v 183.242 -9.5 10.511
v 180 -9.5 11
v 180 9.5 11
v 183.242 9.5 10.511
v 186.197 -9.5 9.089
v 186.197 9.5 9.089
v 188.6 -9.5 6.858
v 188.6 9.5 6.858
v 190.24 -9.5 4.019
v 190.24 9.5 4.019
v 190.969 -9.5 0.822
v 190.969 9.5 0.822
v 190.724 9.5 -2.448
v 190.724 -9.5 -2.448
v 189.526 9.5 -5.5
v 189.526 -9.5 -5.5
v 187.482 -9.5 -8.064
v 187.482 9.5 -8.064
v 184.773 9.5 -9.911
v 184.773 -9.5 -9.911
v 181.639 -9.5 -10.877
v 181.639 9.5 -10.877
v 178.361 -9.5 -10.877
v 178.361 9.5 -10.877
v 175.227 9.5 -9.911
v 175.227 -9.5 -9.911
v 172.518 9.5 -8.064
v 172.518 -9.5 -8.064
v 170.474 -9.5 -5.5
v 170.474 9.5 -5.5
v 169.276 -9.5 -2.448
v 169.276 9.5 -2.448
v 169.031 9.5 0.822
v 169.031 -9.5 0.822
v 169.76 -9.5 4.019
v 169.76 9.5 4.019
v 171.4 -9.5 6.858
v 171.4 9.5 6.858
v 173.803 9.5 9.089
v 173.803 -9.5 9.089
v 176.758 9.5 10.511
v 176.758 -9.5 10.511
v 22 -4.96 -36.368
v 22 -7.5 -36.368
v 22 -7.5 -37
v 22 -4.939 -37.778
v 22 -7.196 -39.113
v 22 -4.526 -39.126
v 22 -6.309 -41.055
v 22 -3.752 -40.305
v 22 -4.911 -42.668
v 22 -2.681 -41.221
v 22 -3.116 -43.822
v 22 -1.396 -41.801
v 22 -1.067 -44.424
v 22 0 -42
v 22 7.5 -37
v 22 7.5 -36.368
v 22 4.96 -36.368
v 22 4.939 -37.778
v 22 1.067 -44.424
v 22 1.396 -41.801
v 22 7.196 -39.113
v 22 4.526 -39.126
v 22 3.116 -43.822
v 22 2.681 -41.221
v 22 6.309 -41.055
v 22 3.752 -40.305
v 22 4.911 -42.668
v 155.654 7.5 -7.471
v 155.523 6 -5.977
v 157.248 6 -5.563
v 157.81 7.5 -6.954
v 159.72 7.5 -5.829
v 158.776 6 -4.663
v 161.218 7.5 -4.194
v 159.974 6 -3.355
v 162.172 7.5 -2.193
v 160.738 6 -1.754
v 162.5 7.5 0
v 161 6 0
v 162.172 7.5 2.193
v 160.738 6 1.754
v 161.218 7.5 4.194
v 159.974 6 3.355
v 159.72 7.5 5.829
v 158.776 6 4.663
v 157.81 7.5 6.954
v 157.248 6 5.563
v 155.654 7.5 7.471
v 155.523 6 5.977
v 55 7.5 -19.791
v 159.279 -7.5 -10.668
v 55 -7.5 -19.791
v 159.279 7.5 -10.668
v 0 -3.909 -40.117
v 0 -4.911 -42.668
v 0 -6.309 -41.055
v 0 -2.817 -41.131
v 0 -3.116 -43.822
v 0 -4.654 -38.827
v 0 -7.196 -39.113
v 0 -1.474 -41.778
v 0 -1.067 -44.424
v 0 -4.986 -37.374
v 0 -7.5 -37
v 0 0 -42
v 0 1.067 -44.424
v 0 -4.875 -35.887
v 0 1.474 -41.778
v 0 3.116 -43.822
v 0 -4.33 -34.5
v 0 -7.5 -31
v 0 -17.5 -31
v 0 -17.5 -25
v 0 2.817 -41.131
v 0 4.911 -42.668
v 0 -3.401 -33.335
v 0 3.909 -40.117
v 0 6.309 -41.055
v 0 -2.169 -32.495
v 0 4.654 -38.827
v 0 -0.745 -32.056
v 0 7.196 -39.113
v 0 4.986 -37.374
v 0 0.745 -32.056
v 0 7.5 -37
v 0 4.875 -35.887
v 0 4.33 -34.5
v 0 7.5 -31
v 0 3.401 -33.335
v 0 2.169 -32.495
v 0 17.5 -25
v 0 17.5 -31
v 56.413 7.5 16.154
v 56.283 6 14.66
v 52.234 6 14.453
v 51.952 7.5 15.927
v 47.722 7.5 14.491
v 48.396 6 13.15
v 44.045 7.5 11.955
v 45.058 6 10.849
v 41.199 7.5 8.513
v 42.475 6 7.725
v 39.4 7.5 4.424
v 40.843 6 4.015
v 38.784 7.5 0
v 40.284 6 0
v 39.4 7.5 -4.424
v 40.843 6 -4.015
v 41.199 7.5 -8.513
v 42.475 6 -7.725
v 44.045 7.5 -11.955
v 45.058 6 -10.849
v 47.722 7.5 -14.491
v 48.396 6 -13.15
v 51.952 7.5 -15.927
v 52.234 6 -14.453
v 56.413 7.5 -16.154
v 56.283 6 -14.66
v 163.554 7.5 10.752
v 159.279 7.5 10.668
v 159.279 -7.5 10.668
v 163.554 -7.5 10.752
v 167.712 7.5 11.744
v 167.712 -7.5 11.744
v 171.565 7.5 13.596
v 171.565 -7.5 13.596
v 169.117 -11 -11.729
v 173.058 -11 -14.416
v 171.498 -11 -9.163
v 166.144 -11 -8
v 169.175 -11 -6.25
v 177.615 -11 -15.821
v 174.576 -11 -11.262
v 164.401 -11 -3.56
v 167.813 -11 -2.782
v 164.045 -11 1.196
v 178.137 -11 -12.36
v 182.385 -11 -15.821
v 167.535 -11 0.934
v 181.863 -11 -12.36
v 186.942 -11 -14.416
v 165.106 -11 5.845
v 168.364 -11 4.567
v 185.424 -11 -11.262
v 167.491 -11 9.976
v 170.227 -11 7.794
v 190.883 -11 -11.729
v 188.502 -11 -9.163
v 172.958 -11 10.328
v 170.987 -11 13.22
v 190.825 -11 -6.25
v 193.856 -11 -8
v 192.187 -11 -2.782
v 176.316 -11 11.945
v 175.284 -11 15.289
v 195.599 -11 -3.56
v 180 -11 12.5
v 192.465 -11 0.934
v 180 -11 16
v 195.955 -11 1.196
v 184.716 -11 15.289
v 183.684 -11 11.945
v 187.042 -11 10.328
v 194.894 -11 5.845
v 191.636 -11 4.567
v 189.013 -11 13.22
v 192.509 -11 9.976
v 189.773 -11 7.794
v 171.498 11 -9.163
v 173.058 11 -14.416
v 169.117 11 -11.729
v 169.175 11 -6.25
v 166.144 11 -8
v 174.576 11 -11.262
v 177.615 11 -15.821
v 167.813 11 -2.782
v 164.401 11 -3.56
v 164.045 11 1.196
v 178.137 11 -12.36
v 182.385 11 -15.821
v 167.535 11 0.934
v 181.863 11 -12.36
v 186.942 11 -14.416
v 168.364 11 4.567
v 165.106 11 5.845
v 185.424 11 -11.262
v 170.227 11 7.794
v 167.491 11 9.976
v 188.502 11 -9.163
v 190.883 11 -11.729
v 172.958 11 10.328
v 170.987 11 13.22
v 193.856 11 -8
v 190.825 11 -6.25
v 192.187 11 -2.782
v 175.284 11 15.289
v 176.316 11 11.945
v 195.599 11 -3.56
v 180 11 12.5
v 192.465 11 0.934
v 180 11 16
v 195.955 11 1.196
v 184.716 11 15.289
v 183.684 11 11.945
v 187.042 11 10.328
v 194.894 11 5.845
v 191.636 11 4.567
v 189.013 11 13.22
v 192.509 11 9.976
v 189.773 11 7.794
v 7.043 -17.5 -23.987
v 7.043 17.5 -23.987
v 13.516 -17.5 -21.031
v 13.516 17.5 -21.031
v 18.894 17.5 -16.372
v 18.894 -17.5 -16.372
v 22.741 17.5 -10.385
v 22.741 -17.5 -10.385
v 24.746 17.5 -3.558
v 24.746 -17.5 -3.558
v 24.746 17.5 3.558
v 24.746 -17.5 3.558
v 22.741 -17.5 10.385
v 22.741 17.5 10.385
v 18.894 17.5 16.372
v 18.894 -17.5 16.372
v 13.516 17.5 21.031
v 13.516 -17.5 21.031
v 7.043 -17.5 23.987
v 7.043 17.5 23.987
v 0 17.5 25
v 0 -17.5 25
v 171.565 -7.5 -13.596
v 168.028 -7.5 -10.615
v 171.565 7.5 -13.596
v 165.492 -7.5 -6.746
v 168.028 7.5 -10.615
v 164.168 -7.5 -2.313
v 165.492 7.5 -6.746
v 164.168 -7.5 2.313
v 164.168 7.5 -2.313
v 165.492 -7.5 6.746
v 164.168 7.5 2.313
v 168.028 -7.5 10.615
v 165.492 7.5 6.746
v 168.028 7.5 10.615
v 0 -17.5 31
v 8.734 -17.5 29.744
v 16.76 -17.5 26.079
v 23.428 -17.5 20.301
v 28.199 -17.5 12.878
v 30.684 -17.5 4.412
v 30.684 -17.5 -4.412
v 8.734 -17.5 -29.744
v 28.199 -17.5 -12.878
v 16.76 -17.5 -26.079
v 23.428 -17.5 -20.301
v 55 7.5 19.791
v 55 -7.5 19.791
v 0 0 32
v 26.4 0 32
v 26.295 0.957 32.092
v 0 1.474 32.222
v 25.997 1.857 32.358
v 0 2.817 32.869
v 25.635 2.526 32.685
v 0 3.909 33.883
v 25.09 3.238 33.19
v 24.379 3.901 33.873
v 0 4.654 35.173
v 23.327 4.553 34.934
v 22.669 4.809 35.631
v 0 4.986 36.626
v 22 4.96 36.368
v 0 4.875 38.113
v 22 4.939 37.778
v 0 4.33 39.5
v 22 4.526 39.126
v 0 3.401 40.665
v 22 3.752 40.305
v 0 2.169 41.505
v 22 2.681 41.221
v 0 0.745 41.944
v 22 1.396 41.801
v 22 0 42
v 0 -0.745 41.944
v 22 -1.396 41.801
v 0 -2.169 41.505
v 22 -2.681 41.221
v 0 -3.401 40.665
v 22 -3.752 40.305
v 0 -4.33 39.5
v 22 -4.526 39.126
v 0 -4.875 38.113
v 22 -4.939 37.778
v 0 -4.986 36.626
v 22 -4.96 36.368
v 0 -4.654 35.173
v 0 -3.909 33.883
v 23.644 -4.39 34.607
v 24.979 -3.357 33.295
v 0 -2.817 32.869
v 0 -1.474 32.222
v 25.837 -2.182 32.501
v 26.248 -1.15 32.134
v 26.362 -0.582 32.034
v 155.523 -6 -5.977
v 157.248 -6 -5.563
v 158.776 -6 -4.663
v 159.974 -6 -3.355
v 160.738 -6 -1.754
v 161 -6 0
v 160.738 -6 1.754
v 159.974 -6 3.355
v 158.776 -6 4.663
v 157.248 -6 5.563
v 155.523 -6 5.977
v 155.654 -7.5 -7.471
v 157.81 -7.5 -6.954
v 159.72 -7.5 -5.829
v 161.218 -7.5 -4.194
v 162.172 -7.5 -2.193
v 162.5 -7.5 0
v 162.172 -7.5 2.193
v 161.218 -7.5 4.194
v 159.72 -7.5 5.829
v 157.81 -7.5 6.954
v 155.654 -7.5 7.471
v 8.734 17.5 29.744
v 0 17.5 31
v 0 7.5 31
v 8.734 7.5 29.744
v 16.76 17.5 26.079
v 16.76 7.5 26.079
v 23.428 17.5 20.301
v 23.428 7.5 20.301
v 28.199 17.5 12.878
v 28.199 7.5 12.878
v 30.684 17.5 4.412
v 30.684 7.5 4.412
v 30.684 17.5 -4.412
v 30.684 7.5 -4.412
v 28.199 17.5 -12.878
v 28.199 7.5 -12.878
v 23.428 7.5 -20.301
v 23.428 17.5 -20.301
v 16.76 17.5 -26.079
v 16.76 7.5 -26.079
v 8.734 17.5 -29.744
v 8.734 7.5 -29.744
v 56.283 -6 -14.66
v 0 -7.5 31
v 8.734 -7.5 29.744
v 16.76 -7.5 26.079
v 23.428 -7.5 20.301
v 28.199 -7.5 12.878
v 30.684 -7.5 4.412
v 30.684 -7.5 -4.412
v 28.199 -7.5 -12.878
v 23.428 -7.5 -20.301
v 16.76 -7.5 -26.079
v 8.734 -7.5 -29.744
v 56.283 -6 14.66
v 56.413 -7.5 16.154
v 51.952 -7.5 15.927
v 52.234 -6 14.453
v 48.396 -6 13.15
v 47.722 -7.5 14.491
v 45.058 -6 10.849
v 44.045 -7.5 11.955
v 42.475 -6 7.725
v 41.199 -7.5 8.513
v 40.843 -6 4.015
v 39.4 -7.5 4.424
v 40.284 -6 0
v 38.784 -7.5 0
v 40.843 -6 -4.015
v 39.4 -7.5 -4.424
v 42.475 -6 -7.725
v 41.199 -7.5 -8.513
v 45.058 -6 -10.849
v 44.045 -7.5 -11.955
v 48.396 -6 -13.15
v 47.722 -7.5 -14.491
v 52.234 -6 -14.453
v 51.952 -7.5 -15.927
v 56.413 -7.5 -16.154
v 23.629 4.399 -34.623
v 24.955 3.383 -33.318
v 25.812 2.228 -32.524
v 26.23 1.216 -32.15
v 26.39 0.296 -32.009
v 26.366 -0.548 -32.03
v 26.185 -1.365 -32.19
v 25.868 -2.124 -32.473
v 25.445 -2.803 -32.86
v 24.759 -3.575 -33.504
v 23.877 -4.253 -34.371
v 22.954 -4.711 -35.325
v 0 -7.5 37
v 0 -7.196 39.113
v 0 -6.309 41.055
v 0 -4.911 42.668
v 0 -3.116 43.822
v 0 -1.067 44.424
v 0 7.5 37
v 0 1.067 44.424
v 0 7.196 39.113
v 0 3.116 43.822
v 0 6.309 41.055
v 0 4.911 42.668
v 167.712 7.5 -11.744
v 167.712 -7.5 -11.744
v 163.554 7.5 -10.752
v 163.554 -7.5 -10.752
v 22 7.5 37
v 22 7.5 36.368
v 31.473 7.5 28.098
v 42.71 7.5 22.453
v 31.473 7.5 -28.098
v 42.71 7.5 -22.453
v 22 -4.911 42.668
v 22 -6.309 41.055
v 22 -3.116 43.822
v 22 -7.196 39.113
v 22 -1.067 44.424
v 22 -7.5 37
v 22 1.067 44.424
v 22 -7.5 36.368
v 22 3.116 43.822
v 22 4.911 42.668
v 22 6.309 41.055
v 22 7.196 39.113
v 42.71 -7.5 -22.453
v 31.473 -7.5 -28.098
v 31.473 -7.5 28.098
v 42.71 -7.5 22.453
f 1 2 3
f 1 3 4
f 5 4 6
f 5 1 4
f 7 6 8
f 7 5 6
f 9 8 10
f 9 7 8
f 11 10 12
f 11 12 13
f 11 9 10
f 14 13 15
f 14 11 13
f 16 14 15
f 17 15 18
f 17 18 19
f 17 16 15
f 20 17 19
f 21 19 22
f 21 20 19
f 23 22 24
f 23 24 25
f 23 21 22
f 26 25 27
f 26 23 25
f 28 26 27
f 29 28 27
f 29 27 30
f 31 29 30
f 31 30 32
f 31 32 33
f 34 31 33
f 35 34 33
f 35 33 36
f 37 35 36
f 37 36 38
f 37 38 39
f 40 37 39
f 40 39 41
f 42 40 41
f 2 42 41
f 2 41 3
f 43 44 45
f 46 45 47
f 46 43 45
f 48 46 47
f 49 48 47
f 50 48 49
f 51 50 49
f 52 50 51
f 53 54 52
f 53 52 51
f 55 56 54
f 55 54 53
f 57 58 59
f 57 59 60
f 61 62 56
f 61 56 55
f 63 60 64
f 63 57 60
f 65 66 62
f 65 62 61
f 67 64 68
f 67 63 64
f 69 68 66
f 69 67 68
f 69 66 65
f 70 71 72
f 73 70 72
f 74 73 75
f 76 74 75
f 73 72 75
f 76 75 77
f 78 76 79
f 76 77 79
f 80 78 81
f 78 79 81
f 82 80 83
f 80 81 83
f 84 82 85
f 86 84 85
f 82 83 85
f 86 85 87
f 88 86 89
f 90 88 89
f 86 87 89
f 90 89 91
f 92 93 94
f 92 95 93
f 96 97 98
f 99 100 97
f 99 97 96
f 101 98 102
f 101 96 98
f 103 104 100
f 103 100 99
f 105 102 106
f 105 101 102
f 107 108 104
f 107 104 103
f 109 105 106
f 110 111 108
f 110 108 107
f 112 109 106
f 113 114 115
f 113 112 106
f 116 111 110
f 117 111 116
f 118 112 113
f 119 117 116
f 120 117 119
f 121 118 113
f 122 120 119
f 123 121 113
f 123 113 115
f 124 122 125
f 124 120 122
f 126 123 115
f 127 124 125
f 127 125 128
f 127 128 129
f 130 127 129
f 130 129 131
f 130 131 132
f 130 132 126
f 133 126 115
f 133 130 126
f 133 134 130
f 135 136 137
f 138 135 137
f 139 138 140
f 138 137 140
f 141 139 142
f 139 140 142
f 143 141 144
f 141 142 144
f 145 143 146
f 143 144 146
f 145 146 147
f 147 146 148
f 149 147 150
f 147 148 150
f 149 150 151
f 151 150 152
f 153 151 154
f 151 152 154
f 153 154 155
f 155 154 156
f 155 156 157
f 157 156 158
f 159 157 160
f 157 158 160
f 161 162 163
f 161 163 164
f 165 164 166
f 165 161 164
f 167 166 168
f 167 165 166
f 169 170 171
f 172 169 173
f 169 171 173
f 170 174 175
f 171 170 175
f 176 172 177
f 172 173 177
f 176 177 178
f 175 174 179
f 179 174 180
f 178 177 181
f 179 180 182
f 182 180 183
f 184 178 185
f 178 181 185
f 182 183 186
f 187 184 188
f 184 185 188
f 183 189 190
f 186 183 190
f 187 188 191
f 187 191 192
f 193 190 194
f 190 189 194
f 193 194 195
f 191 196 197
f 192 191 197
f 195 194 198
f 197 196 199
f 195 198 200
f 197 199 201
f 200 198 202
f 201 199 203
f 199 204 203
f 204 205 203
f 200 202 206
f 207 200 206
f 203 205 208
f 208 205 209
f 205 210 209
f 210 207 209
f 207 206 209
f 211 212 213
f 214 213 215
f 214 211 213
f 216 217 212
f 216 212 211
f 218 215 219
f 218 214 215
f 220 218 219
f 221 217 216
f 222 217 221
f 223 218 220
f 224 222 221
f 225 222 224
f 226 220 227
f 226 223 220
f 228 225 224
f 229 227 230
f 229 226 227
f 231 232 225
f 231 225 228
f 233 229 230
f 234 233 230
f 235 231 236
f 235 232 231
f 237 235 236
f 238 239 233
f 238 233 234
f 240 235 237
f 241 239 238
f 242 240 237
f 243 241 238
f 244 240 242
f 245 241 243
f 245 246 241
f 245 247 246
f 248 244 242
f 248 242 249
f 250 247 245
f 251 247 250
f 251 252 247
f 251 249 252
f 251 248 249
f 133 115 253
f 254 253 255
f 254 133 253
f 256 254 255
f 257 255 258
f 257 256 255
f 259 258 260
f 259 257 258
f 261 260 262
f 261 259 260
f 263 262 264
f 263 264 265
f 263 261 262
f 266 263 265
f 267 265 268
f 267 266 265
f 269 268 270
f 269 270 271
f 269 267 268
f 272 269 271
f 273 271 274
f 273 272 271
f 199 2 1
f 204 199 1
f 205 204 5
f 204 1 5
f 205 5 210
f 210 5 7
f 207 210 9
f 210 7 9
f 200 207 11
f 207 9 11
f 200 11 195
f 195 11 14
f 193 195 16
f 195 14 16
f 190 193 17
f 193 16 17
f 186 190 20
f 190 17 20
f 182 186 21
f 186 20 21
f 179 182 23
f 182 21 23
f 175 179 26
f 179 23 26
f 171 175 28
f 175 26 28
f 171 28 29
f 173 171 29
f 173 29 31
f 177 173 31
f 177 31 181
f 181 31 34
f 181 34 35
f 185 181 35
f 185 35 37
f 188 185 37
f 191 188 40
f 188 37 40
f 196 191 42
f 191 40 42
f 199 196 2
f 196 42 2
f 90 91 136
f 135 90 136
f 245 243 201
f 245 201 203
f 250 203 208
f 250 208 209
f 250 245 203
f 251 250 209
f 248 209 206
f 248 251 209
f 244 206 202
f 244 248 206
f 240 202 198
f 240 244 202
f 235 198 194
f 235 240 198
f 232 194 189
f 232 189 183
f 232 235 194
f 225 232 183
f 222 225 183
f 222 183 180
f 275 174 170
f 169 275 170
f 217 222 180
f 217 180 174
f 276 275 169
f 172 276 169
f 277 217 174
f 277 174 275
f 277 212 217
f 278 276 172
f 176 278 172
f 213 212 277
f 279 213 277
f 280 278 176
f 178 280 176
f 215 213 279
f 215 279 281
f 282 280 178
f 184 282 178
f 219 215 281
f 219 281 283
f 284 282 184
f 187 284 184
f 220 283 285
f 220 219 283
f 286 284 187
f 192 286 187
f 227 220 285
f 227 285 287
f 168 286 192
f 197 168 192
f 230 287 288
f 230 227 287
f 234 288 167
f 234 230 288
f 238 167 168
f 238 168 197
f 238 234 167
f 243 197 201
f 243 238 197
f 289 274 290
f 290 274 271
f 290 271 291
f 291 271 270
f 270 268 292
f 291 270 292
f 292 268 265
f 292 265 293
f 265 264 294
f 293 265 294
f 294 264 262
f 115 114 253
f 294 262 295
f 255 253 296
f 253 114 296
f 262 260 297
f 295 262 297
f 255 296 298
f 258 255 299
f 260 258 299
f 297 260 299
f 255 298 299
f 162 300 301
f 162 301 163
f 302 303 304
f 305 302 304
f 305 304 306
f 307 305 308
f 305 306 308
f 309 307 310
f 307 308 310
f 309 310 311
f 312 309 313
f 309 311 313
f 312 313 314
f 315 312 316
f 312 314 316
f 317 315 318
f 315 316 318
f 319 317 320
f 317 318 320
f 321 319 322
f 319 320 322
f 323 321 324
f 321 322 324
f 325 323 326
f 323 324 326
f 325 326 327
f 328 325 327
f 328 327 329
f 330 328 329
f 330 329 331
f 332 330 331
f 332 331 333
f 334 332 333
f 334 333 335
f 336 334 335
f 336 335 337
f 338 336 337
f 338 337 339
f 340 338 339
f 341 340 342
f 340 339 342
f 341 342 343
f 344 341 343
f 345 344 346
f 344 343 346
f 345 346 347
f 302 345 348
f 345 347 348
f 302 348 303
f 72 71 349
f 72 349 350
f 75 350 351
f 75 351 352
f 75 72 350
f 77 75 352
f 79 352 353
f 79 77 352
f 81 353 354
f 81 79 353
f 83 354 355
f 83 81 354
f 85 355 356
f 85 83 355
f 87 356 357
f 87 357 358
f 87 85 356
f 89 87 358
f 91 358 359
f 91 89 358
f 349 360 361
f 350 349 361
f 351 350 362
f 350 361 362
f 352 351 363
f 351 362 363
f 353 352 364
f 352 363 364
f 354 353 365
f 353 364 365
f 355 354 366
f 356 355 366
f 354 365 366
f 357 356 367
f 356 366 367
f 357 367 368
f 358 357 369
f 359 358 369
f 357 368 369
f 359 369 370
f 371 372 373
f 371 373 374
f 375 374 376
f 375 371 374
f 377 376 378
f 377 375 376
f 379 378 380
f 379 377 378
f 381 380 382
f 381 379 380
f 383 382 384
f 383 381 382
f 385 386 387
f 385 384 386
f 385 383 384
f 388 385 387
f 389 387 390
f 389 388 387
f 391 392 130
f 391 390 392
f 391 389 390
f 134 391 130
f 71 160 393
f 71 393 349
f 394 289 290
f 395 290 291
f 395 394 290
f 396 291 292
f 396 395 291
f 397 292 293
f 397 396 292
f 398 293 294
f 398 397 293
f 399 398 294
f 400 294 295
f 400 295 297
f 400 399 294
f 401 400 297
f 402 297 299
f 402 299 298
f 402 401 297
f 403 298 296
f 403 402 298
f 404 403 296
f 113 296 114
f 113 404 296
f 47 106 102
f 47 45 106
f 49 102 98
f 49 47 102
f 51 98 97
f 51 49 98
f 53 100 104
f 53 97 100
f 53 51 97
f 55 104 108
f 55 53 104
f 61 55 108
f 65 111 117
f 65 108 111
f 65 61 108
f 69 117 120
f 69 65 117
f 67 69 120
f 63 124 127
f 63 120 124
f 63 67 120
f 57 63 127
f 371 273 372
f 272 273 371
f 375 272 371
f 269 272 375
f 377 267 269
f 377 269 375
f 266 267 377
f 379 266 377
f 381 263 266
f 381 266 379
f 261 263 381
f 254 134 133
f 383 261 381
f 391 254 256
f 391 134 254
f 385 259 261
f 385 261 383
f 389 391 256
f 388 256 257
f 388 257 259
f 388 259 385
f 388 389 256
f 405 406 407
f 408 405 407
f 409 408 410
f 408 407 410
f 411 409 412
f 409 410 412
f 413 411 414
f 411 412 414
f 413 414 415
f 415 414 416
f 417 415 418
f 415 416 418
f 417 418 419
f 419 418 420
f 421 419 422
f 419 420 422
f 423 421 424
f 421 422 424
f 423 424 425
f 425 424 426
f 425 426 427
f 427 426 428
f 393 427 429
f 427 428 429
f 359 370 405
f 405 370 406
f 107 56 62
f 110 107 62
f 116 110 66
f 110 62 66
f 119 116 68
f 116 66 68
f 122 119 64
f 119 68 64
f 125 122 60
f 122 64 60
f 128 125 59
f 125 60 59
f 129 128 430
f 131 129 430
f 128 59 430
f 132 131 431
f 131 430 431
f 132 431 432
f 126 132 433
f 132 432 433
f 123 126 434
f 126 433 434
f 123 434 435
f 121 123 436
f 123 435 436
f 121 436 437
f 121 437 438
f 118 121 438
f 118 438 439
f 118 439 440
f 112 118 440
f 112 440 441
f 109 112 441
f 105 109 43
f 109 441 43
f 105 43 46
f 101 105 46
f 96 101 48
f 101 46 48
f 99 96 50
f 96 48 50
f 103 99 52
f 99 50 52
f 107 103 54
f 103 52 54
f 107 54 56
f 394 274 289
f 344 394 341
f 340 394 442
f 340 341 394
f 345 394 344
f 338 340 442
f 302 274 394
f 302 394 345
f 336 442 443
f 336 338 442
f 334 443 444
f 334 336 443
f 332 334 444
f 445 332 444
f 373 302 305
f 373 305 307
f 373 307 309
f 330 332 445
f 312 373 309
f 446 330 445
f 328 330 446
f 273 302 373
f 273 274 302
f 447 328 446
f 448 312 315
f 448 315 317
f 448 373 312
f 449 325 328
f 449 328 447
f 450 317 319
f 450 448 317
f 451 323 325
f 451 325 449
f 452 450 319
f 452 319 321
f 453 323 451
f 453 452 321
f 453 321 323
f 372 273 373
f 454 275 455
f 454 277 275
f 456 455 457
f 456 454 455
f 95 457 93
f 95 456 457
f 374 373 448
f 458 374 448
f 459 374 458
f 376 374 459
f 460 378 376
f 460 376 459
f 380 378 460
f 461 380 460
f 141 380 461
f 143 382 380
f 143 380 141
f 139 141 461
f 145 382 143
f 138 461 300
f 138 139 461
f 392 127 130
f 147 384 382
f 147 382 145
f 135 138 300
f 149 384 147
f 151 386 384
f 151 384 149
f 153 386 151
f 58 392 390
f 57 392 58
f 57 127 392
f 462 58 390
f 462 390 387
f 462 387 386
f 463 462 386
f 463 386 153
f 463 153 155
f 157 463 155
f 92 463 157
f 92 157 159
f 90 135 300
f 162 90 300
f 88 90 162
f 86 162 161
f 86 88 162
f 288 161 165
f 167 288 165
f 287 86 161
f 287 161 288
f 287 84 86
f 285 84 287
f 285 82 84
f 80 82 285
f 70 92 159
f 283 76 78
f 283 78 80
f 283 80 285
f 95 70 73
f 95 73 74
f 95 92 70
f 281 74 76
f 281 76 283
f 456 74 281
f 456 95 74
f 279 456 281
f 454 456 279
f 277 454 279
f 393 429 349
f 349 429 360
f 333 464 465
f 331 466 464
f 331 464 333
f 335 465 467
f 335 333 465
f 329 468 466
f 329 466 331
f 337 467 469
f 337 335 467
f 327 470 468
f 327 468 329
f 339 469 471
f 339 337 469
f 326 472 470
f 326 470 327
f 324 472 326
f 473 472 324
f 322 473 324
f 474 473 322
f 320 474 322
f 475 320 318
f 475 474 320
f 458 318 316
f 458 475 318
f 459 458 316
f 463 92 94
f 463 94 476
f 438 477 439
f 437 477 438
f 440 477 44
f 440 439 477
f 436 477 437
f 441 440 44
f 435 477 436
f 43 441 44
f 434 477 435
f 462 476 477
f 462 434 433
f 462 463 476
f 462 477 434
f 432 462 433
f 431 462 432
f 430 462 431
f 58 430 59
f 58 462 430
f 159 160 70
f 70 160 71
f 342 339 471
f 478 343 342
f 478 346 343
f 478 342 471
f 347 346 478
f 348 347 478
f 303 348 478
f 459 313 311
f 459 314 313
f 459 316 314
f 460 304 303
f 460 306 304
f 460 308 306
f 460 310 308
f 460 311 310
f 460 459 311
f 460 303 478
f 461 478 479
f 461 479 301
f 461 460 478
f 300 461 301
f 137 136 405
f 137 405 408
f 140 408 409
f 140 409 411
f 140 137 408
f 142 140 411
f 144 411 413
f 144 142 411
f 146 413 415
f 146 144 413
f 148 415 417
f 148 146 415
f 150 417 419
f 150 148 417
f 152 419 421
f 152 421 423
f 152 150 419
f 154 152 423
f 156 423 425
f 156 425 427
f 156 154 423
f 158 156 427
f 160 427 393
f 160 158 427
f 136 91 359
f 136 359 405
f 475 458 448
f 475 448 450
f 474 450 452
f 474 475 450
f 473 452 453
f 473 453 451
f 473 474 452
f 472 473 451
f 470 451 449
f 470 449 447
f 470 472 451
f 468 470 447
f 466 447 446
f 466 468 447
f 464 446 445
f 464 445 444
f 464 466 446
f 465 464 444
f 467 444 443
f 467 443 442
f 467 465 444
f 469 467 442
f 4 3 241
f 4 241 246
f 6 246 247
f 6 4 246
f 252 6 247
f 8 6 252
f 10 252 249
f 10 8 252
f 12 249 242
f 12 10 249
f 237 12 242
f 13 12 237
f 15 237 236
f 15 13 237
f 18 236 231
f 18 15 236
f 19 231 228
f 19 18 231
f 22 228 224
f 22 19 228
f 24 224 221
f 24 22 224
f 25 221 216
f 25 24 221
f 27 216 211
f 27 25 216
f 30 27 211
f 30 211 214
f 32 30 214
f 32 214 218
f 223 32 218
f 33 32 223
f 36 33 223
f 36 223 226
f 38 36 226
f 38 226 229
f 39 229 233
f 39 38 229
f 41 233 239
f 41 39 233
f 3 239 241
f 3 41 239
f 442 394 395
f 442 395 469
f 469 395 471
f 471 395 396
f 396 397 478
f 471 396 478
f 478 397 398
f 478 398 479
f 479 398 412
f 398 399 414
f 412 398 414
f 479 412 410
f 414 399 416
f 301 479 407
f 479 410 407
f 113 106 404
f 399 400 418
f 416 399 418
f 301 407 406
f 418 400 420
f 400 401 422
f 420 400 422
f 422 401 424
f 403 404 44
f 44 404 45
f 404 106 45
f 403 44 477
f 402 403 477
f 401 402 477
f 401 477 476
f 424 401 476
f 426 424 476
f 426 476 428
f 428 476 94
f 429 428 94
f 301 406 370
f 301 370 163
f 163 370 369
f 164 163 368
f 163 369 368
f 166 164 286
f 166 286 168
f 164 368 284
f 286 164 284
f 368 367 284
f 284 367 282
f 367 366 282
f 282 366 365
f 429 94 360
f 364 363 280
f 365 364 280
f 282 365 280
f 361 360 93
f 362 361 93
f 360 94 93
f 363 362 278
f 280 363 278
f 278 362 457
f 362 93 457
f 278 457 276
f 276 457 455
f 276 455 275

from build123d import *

# Parameters (mm, degrees)
BOSS_EXTRUDE1_DEPTH    = 17.5
SKETCH1_3_R            = 16
SKETCH1_3_R_2          = 11
BOSS_EXTRUDE2_DEPTH    = 11
BOSS_EXTRUDE3_DEPTH    = 7.5
F_10_0MM_DOWEL_HOLE1_D = 10
FILLET1_RADIUS         = 7.5
FILLET1_LENGTH         = 22
FILLET2_RADIUS         = 7.5
FILLET2_LENGTH         = 22
CHAMFER1_SIZE          = 1.5
CHAMFER2_SIZE          = 1.5


with BuildPart() as part:
    # Sketch1 → Boss-Extrude1 (new, symmetric)
    with BuildSketch(Plane(origin=(0, 0, 0), x_dir=(1, 0, 0), z_dir=(0, 1, 0))):
        with BuildLine():
            Line((0, 31), (0, 25))
            ThreePointArc((0, 25), (25, 0), (0, -25))
            Line((0, -25), (0, -31))
            ThreePointArc((0, -31), (31, 0), (0, 31))
        make_face()
    extrude(amount=BOSS_EXTRUDE1_DEPTH, both=True)



with BuildPart() as body_2:
    # Sketch1<3> → Boss-Extrude2 (new, symmetric)
    with BuildSketch(Plane(origin=(0, 0, 0), x_dir=(1, 0, 0), z_dir=(0, 1, 0))):
        with Locations(Location((180, 0, 0), (0, 0, 270))):
            Circle(SKETCH1_3_R)
        with Locations(Location((180, 0, 0), (0, 0, 270))):
            Circle(SKETCH1_3_R_2, mode=Mode.SUBTRACT)
    extrude(amount=BOSS_EXTRUDE2_DEPTH, both=True)


with BuildPart() as part_1:
    add(part.part)

    add(body_2.part)  # Boss-Extrude3 merges body 2
    # Sketch1<4> → Boss-Extrude3 (add, symmetric)
    with BuildSketch(Plane(origin=(0, 0, 0), x_dir=(1, 0, 0), z_dir=(0, 1, 0))):
        with BuildLine():
            Line((0, 44.5), (0, 31))
            ThreePointArc((0, 31), (31, 0), (0, -31))
            Line((0, -31), (0, -44.5))
            Line((0, -44.5), (22, -44.5))
            Line((22, -44.5), (22, -36.368169362))
            ThreePointArc((22, -36.368169362), (36.913436466, -24.9211933), (55, -19.790884566))
            Line((55, -19.790884566), (159.279067997, -10.667648273))
            ThreePointArc((159.279067997, -10.667648273), (165.659496532, -11.136586007), (171.565414601, -13.596240993))
            ThreePointArc((171.565414601, -13.596240993), (164, 0), (171.565414601, 13.596240993))
            ThreePointArc((171.565414601, 13.596240993), (165.659496532, 11.136586007), (159.279067997, 10.667648273))
            Line((159.279067997, 10.667648273), (55, 19.790884566))
            ThreePointArc((55, 19.790884566), (36.913436466, 24.9211933), (22, 36.368169362))
            Line((22, 36.368169362), (22, 44.5))
            Line((22, 44.5), (0, 44.5))
        make_face()
        with BuildLine():
            ThreePointArc((56.282546806, -14.659577072), (40.284425725, 0), (56.282546806, 14.659577072))
            Line((56.282546806, 14.659577072), (155.522934456, 5.977168189))
            ThreePointArc((155.522934456, 5.977168189), (161, 0), (155.522934456, -5.977168189))
            Line((155.522934456, -5.977168189), (56.282546806, -14.659577072))
        make_face(mode=Mode.SUBTRACT)
    extrude(amount=BOSS_EXTRUDE3_DEPTH, both=True)

    # Ø10.0mm Dowel Hole1 (through all)
    with Locations(Plane.ZY):
        with Locations((-37, 0), (37, 0)):
            Hole(F_10_0MM_DOWEL_HOLE1_D / 2)

    # Fillet1: full round fillet: the end face becomes a half cylinder, R = half its width
    fillet1_face = Plane((11, 0, 44.5), x_dir=(1, 0, 0), z_dir=(0, 0, 1))  # on the end face: x along it, z out of the body
    fillet1_slab = fillet1_face.offset(-FILLET1_RADIUS / 2) * Box(FILLET1_LENGTH, 2 * FILLET1_RADIUS, FILLET1_RADIUS, mode=Mode.PRIVATE)  # the body's end, R deep
    fillet1_round = Plane((11, 0, 37), x_dir=(0, 0, 1), z_dir=(1, 0, 0)) * Cylinder(FILLET1_RADIUS, FILLET1_LENGTH, mode=Mode.PRIVATE)  # its axis R under the face
    add(fillet1_slab - fillet1_round, mode=Mode.SUBTRACT)

    # Fillet2: full round fillet: the end face becomes a half cylinder, R = half its width
    fillet2_face = Plane((11, 0, -44.5), x_dir=(1, 0, 0), z_dir=(0, 0, -1))  # on the end face: x along it, z out of the body
    fillet2_slab = fillet2_face.offset(-FILLET2_RADIUS / 2) * Box(FILLET2_LENGTH, 2 * FILLET2_RADIUS, FILLET2_RADIUS, mode=Mode.PRIVATE)  # the body's end, R deep
    fillet2_round = Plane((11, 0, -37), x_dir=(0, 0, -1), z_dir=(1, 0, 0)) * Cylinder(FILLET2_RADIUS, FILLET2_LENGTH, mode=Mode.PRIVATE)  # its axis R under the face
    add(fillet2_slab - fillet2_round, mode=Mode.SUBTRACT)

    # Chamfer1
    chamfer1_edges = [part_1.edges().sort_by_distance(p)[0] for p in [
        (105.902740631, -7.5, 10.31837263),
        (40.284425725, -7.5, 0),
        (105.902740631, -7.5, -10.31837263),
        (161, -7.5, 0),
        (105.902740631, 7.5, 10.31837263),
        (40.284425725, 7.5, 0),
        (105.902740631, 7.5, -10.31837263),
        (161, 7.5, 0),
    ]]
    chamfer(chamfer1_edges, length=CHAMFER1_SIZE)

    # Chamfer2
    chamfer2_edges = [part_1.edges().sort_by_distance(p)[0] for p in [
        (180, 11, -11),
        (180, -11, -11),
    ]]
    chamfer(chamfer2_edges, length=CHAMFER2_SIZE)


solid = part_1.part
